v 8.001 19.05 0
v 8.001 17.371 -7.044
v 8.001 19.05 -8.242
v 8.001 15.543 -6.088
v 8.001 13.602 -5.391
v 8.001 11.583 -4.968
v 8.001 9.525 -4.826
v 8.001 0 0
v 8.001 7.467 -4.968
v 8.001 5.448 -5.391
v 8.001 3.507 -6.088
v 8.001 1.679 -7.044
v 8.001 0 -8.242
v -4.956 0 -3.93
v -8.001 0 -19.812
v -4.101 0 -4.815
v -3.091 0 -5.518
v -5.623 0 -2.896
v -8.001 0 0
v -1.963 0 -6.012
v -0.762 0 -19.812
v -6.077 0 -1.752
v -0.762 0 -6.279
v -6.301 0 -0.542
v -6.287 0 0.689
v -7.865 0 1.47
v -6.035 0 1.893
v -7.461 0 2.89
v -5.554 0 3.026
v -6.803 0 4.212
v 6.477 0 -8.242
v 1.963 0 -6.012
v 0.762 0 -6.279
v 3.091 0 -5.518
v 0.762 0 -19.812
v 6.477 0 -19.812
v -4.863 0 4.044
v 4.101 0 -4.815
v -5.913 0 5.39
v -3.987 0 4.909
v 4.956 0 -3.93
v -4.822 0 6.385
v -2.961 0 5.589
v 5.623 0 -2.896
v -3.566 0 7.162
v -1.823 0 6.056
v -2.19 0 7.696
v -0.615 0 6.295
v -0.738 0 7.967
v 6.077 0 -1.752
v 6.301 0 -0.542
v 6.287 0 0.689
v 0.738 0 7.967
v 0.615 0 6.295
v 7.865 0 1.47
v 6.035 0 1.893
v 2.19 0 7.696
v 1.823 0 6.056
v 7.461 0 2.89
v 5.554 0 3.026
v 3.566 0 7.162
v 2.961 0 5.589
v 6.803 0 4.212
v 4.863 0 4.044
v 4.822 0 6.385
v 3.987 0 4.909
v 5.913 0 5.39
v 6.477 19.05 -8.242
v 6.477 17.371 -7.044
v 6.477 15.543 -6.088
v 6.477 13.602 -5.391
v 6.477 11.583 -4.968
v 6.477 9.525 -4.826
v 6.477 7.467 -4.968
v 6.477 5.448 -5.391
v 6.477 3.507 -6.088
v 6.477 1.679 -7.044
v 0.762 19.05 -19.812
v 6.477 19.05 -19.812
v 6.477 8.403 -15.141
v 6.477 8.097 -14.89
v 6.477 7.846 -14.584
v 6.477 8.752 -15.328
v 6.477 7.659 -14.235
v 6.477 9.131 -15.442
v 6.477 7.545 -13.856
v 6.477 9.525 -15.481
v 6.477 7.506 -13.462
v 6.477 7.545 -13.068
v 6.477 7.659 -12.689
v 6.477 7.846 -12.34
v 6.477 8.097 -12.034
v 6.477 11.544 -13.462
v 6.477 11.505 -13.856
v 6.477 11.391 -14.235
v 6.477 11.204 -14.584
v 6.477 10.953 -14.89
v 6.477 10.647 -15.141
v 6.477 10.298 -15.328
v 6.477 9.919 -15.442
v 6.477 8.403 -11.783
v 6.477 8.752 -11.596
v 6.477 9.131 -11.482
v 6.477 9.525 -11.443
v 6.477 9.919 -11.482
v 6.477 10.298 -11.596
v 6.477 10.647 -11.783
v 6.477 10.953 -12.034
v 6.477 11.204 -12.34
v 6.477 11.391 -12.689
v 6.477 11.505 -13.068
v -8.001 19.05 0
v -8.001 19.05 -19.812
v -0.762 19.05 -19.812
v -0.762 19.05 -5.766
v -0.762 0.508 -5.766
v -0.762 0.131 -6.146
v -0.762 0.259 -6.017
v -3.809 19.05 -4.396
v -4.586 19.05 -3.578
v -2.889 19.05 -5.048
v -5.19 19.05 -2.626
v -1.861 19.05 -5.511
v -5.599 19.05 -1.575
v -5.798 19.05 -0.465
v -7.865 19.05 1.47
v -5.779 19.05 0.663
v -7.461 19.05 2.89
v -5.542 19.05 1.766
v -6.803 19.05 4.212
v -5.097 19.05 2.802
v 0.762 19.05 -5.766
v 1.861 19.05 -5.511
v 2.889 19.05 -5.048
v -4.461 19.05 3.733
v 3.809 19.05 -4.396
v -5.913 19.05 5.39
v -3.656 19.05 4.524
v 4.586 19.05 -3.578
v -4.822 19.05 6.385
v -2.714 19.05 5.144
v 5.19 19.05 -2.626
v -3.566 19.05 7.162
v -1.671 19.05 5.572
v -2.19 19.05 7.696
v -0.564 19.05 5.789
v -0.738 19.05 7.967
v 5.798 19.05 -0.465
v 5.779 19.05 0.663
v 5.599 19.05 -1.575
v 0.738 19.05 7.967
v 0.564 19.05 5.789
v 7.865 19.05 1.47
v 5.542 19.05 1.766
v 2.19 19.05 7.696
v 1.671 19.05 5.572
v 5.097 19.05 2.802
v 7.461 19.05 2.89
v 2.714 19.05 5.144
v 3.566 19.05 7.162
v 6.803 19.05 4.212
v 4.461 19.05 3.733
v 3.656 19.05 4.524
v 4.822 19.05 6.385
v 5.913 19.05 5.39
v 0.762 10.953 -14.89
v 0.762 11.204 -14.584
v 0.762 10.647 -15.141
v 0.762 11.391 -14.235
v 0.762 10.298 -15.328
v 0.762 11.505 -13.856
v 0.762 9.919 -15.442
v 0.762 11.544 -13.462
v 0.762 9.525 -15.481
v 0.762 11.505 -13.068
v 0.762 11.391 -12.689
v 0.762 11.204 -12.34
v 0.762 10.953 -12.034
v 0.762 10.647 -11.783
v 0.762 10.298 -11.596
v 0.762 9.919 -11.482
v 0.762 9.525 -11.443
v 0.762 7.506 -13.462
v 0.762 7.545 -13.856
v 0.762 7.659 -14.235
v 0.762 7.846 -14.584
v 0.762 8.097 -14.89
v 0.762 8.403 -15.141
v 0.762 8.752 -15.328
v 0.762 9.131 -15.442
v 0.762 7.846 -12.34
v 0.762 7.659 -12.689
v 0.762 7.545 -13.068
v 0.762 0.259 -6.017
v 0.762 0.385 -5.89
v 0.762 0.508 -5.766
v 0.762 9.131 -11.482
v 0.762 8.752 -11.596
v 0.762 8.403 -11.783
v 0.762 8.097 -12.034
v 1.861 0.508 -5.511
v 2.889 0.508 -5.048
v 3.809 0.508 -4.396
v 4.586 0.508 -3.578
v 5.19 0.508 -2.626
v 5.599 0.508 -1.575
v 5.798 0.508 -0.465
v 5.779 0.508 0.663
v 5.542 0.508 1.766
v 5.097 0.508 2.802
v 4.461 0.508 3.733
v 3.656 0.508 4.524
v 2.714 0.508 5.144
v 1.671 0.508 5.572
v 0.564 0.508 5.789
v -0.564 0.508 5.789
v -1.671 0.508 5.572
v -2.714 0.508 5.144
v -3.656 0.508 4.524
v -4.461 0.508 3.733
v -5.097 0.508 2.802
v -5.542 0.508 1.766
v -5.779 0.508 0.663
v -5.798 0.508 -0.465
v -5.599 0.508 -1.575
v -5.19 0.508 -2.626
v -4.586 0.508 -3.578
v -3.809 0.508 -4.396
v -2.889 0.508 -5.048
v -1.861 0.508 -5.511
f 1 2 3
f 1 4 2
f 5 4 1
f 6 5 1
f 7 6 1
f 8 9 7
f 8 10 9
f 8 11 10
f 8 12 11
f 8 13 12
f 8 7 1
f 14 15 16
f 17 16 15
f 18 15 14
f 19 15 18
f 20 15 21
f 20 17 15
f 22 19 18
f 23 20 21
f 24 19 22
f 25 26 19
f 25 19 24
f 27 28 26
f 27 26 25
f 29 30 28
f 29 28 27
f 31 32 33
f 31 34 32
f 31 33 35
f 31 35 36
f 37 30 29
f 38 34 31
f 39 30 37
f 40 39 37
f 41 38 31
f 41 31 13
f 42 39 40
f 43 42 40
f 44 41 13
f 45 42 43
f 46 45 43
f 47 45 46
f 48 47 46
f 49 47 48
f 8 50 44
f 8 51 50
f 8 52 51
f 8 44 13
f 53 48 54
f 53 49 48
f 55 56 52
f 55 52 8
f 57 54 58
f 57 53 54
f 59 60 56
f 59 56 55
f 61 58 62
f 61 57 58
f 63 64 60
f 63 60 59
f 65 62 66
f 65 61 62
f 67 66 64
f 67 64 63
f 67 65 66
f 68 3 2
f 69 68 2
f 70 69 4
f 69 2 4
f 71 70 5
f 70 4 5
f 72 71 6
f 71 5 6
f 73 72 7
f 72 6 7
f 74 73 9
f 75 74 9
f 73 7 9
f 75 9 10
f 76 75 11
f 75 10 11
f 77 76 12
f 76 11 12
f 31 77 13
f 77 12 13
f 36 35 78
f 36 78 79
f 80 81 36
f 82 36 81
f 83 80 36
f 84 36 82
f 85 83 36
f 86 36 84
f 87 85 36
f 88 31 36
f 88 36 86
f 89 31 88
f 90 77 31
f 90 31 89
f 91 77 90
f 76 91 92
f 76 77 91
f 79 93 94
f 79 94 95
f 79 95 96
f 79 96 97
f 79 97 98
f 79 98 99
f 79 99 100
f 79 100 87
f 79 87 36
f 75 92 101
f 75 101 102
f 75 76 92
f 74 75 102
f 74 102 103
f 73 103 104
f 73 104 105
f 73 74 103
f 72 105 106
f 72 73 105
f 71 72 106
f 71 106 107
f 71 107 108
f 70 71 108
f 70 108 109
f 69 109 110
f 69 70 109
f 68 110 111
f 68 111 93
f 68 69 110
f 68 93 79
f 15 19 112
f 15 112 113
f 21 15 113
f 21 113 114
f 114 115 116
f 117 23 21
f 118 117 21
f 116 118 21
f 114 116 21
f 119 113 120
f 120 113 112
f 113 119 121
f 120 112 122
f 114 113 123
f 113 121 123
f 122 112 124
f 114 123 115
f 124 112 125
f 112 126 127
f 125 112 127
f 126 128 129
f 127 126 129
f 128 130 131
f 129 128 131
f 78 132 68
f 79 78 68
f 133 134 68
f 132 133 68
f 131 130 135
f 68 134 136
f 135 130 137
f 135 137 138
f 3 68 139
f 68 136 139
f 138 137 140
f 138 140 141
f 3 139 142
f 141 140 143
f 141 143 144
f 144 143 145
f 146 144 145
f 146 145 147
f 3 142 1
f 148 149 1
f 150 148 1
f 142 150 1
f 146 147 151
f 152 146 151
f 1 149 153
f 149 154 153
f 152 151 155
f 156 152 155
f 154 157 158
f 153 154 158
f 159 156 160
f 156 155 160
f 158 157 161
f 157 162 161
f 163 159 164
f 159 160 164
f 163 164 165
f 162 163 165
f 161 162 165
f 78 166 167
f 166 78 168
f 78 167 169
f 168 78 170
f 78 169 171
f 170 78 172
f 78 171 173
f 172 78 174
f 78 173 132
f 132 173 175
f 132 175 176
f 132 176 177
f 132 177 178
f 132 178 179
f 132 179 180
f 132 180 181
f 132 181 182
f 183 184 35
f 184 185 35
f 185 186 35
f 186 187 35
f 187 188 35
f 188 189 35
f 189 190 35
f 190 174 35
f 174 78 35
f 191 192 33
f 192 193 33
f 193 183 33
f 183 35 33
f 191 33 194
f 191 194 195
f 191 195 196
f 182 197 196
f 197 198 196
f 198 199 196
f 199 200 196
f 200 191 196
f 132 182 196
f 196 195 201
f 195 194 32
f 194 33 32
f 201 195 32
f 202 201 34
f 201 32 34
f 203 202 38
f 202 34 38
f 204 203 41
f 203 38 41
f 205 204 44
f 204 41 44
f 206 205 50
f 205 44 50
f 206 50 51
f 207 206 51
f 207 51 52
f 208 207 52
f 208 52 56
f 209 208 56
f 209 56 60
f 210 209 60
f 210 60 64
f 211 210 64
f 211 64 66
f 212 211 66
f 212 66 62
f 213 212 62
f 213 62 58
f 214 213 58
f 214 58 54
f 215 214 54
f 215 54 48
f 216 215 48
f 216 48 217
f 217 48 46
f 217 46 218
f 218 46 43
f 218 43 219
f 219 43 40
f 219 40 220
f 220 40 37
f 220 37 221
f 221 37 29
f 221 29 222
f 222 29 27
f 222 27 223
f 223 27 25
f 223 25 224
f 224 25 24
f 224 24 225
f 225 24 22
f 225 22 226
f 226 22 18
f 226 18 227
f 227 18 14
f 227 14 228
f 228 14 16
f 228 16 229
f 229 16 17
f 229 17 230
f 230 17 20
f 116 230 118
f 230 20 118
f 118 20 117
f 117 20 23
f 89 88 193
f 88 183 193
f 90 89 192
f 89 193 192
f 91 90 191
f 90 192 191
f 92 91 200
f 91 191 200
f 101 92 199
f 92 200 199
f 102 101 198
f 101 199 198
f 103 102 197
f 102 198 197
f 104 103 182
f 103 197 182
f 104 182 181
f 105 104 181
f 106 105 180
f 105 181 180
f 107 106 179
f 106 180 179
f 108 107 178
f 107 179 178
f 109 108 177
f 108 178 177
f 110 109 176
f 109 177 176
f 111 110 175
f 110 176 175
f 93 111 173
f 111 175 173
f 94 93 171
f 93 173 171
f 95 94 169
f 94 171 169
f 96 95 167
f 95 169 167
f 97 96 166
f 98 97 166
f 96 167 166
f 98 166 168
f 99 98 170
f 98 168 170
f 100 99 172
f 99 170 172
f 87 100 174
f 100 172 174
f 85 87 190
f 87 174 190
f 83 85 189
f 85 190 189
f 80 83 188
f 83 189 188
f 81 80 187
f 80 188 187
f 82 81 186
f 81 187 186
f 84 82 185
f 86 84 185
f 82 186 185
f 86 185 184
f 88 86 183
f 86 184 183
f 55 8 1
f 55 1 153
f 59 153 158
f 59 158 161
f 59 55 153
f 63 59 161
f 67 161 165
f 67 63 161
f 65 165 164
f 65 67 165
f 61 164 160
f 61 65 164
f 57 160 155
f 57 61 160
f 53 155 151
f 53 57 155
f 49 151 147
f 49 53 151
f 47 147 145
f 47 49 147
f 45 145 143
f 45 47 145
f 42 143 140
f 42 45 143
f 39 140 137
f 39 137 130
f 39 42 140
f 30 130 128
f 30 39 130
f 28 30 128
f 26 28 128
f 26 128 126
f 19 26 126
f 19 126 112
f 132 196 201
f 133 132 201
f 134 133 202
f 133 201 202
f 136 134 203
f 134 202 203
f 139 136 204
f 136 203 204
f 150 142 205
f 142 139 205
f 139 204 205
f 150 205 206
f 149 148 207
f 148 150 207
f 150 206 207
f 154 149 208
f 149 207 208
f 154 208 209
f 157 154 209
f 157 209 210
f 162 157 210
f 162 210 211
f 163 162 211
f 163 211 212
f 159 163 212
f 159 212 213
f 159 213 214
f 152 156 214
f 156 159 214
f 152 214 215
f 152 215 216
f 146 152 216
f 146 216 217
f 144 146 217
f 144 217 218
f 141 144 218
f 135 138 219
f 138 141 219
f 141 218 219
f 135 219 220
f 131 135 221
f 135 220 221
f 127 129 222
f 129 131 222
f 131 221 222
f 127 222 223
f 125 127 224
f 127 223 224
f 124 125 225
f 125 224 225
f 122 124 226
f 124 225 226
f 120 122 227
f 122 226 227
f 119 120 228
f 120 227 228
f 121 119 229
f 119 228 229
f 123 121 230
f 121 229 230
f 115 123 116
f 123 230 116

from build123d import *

# Parameters (mm, degrees)
F0_R     = 5.8166
F1_DEPTH = 19.05
F2_SIZE2 = 0.508
F2_SIZE  = 0.508
F4_DEPTH = 25.4
F6_DEPTH = 1.524
F8_D     = 4.0386
F8_DEPTH = 5.715
F8_TIP   = 1.213317848


with BuildPart() as f1:
    # F0 (on Front) → F1 (new body)
    with BuildSketch(Plane.XZ):
        with BuildLine():
            Line((8.001, -19.812), (8.001, 0))
            ThreePointArc((8.001, 0), (0, 8.001), (-8.001, 0))
            Line((-8.001, 0), (-8.001, -19.812))
            Line((-8.001, -19.812), (8.001, -19.812))
        make_face()
        Circle(F0_R, mode=Mode.SUBTRACT)
    extrude(amount=-F1_DEPTH)

    # F2
    f2_edges = [f1.edges().sort_by_distance(p)[0] for p in [
        (-5.8166, 0, 0),
    ]]
    chamfer(f2_edges, length=F2_SIZE, length2=F2_SIZE2)

    # F3 (on face) → F4 (cut)
    with BuildSketch(Plane.XZ):
        with BuildLine():
            Line((-0.762, -6.2785285824), (-0.762, -19.812))
            Line((-0.762, -19.812), (0.762, -19.812))
            Line((0.762, -19.812), (0.762, -6.2785285824))
            ThreePointArc((0.762, -6.2785285824), (0, -6.3246), (-0.762, -6.2785285824))
        make_face()
        with BuildLine():
            Line((-0.762, 0), (-0.762, -6.2785285824))
            ThreePointArc((-0.762, -6.2785285824), (0, -6.3246), (0.762, -6.2785285824))
            Line((0.762, -6.2785285824), (0.762, 0))
            Line((0.762, 0), (-0.762, 0))
        make_face()
    extrude(amount=-F4_DEPTH, mode=Mode.SUBTRACT)

    # F5 (on face) → F6 (cut)
    with BuildSketch(Plane.YZ.offset(8.001)):
        with BuildLine():
            Line((19.05, -19.812), (19.05, -8.2424463785))
            ThreePointArc((19.05, -8.2424463785), (9.525, -4.826), (0, -8.2424463785))
            Line((0, -8.2424463785), (0, -19.812))
            Line((0, -19.812), (19.05, -19.812))
        make_face()
        with BuildLine():
            ThreePointArc((0, -8.2424463785), (3.1281825882, -33.3641556588), (24.511, -19.812))
            ThreePointArc((24.511, -19.812), (23.0771556588, -13.4151825882), (19.05, -8.2424463785))
            Line((19.05, -8.2424463785), (19.05, -19.812))
            Line((19.05, -19.812), (0, -19.812))
            Line((0, -19.812), (0, -8.2424463785))
        make_face()
    extrude(amount=-F6_DEPTH, mode=Mode.SUBTRACT)

    # F8
    with Locations(Plane.YZ.offset(6.477)):
        with Locations((9.525, -13.462)):
            Hole(F8_D / 2, depth=F8_DEPTH)
            with Locations((0, 0, -(F8_DEPTH + F8_TIP / 2))):  # 118° drill point
                Cone(0, F8_D / 2, F8_TIP, mode=Mode.SUBTRACT)


solid = f1.part
